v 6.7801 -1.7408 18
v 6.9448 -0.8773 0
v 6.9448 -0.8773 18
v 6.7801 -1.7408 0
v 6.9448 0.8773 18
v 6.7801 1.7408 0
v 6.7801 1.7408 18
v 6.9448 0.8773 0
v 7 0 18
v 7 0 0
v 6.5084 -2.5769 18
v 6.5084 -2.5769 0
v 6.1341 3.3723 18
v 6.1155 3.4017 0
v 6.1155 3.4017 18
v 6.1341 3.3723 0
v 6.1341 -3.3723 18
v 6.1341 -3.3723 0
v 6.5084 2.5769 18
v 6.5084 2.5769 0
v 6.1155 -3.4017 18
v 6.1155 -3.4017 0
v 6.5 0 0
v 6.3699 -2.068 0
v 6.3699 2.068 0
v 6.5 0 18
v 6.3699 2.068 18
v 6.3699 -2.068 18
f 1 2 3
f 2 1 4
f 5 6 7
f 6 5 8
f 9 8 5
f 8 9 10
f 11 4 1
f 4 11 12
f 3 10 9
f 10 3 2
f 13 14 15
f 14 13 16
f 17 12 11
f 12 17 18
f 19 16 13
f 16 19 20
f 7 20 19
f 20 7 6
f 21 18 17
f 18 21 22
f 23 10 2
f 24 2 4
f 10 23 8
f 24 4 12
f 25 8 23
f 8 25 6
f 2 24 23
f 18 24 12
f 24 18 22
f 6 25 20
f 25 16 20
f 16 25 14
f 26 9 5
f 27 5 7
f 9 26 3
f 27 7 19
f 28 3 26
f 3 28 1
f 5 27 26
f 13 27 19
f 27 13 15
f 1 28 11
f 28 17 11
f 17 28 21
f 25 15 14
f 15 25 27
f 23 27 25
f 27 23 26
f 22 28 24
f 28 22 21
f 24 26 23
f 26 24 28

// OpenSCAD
$fn = 50;


difference() {
	union() {
		cylinder(h = 18, r = 7.0000000000);
		translate(v = [-13.0000000000, 0, 0]) {
			cylinder(h = 18, r = 7.0000000000);
		}
	}
	union() {
		cylinder(h = 18, r = 3.2500000000);
		cylinder(h = 18, r = 1.8000000000);
		cylinder(h = 18, r = 1.8000000000);
		cylinder(h = 18, r = 1.8000000000);
		translate(v = [-17.5000000000, 0, 0]) {
			hull() {
				translate(v = [-3.7500000000, 0.0000000000, 0]) {
					cylinder(h = 18, r = 7.5000000000);
				}
				translate(v = [3.7500000000, 0.0000000000, 0]) {
					cylinder(h = 18, r = 7.5000000000);
				}
				translate(v = [-3.7500000000, -0.0000000000, 0]) {
					cylinder(h = 18, r = 7.5000000000);
				}
				translate(v = [3.7500000000, -0.0000000000, 0]) {
					cylinder(h = 18, r = 7.5000000000);
				}
			}
		}
		translate(v = [-10.0000000000, 0, 0.0000000000]) {
			cylinder(h = 18, r = 16.5000000000);
		}
	}
}
